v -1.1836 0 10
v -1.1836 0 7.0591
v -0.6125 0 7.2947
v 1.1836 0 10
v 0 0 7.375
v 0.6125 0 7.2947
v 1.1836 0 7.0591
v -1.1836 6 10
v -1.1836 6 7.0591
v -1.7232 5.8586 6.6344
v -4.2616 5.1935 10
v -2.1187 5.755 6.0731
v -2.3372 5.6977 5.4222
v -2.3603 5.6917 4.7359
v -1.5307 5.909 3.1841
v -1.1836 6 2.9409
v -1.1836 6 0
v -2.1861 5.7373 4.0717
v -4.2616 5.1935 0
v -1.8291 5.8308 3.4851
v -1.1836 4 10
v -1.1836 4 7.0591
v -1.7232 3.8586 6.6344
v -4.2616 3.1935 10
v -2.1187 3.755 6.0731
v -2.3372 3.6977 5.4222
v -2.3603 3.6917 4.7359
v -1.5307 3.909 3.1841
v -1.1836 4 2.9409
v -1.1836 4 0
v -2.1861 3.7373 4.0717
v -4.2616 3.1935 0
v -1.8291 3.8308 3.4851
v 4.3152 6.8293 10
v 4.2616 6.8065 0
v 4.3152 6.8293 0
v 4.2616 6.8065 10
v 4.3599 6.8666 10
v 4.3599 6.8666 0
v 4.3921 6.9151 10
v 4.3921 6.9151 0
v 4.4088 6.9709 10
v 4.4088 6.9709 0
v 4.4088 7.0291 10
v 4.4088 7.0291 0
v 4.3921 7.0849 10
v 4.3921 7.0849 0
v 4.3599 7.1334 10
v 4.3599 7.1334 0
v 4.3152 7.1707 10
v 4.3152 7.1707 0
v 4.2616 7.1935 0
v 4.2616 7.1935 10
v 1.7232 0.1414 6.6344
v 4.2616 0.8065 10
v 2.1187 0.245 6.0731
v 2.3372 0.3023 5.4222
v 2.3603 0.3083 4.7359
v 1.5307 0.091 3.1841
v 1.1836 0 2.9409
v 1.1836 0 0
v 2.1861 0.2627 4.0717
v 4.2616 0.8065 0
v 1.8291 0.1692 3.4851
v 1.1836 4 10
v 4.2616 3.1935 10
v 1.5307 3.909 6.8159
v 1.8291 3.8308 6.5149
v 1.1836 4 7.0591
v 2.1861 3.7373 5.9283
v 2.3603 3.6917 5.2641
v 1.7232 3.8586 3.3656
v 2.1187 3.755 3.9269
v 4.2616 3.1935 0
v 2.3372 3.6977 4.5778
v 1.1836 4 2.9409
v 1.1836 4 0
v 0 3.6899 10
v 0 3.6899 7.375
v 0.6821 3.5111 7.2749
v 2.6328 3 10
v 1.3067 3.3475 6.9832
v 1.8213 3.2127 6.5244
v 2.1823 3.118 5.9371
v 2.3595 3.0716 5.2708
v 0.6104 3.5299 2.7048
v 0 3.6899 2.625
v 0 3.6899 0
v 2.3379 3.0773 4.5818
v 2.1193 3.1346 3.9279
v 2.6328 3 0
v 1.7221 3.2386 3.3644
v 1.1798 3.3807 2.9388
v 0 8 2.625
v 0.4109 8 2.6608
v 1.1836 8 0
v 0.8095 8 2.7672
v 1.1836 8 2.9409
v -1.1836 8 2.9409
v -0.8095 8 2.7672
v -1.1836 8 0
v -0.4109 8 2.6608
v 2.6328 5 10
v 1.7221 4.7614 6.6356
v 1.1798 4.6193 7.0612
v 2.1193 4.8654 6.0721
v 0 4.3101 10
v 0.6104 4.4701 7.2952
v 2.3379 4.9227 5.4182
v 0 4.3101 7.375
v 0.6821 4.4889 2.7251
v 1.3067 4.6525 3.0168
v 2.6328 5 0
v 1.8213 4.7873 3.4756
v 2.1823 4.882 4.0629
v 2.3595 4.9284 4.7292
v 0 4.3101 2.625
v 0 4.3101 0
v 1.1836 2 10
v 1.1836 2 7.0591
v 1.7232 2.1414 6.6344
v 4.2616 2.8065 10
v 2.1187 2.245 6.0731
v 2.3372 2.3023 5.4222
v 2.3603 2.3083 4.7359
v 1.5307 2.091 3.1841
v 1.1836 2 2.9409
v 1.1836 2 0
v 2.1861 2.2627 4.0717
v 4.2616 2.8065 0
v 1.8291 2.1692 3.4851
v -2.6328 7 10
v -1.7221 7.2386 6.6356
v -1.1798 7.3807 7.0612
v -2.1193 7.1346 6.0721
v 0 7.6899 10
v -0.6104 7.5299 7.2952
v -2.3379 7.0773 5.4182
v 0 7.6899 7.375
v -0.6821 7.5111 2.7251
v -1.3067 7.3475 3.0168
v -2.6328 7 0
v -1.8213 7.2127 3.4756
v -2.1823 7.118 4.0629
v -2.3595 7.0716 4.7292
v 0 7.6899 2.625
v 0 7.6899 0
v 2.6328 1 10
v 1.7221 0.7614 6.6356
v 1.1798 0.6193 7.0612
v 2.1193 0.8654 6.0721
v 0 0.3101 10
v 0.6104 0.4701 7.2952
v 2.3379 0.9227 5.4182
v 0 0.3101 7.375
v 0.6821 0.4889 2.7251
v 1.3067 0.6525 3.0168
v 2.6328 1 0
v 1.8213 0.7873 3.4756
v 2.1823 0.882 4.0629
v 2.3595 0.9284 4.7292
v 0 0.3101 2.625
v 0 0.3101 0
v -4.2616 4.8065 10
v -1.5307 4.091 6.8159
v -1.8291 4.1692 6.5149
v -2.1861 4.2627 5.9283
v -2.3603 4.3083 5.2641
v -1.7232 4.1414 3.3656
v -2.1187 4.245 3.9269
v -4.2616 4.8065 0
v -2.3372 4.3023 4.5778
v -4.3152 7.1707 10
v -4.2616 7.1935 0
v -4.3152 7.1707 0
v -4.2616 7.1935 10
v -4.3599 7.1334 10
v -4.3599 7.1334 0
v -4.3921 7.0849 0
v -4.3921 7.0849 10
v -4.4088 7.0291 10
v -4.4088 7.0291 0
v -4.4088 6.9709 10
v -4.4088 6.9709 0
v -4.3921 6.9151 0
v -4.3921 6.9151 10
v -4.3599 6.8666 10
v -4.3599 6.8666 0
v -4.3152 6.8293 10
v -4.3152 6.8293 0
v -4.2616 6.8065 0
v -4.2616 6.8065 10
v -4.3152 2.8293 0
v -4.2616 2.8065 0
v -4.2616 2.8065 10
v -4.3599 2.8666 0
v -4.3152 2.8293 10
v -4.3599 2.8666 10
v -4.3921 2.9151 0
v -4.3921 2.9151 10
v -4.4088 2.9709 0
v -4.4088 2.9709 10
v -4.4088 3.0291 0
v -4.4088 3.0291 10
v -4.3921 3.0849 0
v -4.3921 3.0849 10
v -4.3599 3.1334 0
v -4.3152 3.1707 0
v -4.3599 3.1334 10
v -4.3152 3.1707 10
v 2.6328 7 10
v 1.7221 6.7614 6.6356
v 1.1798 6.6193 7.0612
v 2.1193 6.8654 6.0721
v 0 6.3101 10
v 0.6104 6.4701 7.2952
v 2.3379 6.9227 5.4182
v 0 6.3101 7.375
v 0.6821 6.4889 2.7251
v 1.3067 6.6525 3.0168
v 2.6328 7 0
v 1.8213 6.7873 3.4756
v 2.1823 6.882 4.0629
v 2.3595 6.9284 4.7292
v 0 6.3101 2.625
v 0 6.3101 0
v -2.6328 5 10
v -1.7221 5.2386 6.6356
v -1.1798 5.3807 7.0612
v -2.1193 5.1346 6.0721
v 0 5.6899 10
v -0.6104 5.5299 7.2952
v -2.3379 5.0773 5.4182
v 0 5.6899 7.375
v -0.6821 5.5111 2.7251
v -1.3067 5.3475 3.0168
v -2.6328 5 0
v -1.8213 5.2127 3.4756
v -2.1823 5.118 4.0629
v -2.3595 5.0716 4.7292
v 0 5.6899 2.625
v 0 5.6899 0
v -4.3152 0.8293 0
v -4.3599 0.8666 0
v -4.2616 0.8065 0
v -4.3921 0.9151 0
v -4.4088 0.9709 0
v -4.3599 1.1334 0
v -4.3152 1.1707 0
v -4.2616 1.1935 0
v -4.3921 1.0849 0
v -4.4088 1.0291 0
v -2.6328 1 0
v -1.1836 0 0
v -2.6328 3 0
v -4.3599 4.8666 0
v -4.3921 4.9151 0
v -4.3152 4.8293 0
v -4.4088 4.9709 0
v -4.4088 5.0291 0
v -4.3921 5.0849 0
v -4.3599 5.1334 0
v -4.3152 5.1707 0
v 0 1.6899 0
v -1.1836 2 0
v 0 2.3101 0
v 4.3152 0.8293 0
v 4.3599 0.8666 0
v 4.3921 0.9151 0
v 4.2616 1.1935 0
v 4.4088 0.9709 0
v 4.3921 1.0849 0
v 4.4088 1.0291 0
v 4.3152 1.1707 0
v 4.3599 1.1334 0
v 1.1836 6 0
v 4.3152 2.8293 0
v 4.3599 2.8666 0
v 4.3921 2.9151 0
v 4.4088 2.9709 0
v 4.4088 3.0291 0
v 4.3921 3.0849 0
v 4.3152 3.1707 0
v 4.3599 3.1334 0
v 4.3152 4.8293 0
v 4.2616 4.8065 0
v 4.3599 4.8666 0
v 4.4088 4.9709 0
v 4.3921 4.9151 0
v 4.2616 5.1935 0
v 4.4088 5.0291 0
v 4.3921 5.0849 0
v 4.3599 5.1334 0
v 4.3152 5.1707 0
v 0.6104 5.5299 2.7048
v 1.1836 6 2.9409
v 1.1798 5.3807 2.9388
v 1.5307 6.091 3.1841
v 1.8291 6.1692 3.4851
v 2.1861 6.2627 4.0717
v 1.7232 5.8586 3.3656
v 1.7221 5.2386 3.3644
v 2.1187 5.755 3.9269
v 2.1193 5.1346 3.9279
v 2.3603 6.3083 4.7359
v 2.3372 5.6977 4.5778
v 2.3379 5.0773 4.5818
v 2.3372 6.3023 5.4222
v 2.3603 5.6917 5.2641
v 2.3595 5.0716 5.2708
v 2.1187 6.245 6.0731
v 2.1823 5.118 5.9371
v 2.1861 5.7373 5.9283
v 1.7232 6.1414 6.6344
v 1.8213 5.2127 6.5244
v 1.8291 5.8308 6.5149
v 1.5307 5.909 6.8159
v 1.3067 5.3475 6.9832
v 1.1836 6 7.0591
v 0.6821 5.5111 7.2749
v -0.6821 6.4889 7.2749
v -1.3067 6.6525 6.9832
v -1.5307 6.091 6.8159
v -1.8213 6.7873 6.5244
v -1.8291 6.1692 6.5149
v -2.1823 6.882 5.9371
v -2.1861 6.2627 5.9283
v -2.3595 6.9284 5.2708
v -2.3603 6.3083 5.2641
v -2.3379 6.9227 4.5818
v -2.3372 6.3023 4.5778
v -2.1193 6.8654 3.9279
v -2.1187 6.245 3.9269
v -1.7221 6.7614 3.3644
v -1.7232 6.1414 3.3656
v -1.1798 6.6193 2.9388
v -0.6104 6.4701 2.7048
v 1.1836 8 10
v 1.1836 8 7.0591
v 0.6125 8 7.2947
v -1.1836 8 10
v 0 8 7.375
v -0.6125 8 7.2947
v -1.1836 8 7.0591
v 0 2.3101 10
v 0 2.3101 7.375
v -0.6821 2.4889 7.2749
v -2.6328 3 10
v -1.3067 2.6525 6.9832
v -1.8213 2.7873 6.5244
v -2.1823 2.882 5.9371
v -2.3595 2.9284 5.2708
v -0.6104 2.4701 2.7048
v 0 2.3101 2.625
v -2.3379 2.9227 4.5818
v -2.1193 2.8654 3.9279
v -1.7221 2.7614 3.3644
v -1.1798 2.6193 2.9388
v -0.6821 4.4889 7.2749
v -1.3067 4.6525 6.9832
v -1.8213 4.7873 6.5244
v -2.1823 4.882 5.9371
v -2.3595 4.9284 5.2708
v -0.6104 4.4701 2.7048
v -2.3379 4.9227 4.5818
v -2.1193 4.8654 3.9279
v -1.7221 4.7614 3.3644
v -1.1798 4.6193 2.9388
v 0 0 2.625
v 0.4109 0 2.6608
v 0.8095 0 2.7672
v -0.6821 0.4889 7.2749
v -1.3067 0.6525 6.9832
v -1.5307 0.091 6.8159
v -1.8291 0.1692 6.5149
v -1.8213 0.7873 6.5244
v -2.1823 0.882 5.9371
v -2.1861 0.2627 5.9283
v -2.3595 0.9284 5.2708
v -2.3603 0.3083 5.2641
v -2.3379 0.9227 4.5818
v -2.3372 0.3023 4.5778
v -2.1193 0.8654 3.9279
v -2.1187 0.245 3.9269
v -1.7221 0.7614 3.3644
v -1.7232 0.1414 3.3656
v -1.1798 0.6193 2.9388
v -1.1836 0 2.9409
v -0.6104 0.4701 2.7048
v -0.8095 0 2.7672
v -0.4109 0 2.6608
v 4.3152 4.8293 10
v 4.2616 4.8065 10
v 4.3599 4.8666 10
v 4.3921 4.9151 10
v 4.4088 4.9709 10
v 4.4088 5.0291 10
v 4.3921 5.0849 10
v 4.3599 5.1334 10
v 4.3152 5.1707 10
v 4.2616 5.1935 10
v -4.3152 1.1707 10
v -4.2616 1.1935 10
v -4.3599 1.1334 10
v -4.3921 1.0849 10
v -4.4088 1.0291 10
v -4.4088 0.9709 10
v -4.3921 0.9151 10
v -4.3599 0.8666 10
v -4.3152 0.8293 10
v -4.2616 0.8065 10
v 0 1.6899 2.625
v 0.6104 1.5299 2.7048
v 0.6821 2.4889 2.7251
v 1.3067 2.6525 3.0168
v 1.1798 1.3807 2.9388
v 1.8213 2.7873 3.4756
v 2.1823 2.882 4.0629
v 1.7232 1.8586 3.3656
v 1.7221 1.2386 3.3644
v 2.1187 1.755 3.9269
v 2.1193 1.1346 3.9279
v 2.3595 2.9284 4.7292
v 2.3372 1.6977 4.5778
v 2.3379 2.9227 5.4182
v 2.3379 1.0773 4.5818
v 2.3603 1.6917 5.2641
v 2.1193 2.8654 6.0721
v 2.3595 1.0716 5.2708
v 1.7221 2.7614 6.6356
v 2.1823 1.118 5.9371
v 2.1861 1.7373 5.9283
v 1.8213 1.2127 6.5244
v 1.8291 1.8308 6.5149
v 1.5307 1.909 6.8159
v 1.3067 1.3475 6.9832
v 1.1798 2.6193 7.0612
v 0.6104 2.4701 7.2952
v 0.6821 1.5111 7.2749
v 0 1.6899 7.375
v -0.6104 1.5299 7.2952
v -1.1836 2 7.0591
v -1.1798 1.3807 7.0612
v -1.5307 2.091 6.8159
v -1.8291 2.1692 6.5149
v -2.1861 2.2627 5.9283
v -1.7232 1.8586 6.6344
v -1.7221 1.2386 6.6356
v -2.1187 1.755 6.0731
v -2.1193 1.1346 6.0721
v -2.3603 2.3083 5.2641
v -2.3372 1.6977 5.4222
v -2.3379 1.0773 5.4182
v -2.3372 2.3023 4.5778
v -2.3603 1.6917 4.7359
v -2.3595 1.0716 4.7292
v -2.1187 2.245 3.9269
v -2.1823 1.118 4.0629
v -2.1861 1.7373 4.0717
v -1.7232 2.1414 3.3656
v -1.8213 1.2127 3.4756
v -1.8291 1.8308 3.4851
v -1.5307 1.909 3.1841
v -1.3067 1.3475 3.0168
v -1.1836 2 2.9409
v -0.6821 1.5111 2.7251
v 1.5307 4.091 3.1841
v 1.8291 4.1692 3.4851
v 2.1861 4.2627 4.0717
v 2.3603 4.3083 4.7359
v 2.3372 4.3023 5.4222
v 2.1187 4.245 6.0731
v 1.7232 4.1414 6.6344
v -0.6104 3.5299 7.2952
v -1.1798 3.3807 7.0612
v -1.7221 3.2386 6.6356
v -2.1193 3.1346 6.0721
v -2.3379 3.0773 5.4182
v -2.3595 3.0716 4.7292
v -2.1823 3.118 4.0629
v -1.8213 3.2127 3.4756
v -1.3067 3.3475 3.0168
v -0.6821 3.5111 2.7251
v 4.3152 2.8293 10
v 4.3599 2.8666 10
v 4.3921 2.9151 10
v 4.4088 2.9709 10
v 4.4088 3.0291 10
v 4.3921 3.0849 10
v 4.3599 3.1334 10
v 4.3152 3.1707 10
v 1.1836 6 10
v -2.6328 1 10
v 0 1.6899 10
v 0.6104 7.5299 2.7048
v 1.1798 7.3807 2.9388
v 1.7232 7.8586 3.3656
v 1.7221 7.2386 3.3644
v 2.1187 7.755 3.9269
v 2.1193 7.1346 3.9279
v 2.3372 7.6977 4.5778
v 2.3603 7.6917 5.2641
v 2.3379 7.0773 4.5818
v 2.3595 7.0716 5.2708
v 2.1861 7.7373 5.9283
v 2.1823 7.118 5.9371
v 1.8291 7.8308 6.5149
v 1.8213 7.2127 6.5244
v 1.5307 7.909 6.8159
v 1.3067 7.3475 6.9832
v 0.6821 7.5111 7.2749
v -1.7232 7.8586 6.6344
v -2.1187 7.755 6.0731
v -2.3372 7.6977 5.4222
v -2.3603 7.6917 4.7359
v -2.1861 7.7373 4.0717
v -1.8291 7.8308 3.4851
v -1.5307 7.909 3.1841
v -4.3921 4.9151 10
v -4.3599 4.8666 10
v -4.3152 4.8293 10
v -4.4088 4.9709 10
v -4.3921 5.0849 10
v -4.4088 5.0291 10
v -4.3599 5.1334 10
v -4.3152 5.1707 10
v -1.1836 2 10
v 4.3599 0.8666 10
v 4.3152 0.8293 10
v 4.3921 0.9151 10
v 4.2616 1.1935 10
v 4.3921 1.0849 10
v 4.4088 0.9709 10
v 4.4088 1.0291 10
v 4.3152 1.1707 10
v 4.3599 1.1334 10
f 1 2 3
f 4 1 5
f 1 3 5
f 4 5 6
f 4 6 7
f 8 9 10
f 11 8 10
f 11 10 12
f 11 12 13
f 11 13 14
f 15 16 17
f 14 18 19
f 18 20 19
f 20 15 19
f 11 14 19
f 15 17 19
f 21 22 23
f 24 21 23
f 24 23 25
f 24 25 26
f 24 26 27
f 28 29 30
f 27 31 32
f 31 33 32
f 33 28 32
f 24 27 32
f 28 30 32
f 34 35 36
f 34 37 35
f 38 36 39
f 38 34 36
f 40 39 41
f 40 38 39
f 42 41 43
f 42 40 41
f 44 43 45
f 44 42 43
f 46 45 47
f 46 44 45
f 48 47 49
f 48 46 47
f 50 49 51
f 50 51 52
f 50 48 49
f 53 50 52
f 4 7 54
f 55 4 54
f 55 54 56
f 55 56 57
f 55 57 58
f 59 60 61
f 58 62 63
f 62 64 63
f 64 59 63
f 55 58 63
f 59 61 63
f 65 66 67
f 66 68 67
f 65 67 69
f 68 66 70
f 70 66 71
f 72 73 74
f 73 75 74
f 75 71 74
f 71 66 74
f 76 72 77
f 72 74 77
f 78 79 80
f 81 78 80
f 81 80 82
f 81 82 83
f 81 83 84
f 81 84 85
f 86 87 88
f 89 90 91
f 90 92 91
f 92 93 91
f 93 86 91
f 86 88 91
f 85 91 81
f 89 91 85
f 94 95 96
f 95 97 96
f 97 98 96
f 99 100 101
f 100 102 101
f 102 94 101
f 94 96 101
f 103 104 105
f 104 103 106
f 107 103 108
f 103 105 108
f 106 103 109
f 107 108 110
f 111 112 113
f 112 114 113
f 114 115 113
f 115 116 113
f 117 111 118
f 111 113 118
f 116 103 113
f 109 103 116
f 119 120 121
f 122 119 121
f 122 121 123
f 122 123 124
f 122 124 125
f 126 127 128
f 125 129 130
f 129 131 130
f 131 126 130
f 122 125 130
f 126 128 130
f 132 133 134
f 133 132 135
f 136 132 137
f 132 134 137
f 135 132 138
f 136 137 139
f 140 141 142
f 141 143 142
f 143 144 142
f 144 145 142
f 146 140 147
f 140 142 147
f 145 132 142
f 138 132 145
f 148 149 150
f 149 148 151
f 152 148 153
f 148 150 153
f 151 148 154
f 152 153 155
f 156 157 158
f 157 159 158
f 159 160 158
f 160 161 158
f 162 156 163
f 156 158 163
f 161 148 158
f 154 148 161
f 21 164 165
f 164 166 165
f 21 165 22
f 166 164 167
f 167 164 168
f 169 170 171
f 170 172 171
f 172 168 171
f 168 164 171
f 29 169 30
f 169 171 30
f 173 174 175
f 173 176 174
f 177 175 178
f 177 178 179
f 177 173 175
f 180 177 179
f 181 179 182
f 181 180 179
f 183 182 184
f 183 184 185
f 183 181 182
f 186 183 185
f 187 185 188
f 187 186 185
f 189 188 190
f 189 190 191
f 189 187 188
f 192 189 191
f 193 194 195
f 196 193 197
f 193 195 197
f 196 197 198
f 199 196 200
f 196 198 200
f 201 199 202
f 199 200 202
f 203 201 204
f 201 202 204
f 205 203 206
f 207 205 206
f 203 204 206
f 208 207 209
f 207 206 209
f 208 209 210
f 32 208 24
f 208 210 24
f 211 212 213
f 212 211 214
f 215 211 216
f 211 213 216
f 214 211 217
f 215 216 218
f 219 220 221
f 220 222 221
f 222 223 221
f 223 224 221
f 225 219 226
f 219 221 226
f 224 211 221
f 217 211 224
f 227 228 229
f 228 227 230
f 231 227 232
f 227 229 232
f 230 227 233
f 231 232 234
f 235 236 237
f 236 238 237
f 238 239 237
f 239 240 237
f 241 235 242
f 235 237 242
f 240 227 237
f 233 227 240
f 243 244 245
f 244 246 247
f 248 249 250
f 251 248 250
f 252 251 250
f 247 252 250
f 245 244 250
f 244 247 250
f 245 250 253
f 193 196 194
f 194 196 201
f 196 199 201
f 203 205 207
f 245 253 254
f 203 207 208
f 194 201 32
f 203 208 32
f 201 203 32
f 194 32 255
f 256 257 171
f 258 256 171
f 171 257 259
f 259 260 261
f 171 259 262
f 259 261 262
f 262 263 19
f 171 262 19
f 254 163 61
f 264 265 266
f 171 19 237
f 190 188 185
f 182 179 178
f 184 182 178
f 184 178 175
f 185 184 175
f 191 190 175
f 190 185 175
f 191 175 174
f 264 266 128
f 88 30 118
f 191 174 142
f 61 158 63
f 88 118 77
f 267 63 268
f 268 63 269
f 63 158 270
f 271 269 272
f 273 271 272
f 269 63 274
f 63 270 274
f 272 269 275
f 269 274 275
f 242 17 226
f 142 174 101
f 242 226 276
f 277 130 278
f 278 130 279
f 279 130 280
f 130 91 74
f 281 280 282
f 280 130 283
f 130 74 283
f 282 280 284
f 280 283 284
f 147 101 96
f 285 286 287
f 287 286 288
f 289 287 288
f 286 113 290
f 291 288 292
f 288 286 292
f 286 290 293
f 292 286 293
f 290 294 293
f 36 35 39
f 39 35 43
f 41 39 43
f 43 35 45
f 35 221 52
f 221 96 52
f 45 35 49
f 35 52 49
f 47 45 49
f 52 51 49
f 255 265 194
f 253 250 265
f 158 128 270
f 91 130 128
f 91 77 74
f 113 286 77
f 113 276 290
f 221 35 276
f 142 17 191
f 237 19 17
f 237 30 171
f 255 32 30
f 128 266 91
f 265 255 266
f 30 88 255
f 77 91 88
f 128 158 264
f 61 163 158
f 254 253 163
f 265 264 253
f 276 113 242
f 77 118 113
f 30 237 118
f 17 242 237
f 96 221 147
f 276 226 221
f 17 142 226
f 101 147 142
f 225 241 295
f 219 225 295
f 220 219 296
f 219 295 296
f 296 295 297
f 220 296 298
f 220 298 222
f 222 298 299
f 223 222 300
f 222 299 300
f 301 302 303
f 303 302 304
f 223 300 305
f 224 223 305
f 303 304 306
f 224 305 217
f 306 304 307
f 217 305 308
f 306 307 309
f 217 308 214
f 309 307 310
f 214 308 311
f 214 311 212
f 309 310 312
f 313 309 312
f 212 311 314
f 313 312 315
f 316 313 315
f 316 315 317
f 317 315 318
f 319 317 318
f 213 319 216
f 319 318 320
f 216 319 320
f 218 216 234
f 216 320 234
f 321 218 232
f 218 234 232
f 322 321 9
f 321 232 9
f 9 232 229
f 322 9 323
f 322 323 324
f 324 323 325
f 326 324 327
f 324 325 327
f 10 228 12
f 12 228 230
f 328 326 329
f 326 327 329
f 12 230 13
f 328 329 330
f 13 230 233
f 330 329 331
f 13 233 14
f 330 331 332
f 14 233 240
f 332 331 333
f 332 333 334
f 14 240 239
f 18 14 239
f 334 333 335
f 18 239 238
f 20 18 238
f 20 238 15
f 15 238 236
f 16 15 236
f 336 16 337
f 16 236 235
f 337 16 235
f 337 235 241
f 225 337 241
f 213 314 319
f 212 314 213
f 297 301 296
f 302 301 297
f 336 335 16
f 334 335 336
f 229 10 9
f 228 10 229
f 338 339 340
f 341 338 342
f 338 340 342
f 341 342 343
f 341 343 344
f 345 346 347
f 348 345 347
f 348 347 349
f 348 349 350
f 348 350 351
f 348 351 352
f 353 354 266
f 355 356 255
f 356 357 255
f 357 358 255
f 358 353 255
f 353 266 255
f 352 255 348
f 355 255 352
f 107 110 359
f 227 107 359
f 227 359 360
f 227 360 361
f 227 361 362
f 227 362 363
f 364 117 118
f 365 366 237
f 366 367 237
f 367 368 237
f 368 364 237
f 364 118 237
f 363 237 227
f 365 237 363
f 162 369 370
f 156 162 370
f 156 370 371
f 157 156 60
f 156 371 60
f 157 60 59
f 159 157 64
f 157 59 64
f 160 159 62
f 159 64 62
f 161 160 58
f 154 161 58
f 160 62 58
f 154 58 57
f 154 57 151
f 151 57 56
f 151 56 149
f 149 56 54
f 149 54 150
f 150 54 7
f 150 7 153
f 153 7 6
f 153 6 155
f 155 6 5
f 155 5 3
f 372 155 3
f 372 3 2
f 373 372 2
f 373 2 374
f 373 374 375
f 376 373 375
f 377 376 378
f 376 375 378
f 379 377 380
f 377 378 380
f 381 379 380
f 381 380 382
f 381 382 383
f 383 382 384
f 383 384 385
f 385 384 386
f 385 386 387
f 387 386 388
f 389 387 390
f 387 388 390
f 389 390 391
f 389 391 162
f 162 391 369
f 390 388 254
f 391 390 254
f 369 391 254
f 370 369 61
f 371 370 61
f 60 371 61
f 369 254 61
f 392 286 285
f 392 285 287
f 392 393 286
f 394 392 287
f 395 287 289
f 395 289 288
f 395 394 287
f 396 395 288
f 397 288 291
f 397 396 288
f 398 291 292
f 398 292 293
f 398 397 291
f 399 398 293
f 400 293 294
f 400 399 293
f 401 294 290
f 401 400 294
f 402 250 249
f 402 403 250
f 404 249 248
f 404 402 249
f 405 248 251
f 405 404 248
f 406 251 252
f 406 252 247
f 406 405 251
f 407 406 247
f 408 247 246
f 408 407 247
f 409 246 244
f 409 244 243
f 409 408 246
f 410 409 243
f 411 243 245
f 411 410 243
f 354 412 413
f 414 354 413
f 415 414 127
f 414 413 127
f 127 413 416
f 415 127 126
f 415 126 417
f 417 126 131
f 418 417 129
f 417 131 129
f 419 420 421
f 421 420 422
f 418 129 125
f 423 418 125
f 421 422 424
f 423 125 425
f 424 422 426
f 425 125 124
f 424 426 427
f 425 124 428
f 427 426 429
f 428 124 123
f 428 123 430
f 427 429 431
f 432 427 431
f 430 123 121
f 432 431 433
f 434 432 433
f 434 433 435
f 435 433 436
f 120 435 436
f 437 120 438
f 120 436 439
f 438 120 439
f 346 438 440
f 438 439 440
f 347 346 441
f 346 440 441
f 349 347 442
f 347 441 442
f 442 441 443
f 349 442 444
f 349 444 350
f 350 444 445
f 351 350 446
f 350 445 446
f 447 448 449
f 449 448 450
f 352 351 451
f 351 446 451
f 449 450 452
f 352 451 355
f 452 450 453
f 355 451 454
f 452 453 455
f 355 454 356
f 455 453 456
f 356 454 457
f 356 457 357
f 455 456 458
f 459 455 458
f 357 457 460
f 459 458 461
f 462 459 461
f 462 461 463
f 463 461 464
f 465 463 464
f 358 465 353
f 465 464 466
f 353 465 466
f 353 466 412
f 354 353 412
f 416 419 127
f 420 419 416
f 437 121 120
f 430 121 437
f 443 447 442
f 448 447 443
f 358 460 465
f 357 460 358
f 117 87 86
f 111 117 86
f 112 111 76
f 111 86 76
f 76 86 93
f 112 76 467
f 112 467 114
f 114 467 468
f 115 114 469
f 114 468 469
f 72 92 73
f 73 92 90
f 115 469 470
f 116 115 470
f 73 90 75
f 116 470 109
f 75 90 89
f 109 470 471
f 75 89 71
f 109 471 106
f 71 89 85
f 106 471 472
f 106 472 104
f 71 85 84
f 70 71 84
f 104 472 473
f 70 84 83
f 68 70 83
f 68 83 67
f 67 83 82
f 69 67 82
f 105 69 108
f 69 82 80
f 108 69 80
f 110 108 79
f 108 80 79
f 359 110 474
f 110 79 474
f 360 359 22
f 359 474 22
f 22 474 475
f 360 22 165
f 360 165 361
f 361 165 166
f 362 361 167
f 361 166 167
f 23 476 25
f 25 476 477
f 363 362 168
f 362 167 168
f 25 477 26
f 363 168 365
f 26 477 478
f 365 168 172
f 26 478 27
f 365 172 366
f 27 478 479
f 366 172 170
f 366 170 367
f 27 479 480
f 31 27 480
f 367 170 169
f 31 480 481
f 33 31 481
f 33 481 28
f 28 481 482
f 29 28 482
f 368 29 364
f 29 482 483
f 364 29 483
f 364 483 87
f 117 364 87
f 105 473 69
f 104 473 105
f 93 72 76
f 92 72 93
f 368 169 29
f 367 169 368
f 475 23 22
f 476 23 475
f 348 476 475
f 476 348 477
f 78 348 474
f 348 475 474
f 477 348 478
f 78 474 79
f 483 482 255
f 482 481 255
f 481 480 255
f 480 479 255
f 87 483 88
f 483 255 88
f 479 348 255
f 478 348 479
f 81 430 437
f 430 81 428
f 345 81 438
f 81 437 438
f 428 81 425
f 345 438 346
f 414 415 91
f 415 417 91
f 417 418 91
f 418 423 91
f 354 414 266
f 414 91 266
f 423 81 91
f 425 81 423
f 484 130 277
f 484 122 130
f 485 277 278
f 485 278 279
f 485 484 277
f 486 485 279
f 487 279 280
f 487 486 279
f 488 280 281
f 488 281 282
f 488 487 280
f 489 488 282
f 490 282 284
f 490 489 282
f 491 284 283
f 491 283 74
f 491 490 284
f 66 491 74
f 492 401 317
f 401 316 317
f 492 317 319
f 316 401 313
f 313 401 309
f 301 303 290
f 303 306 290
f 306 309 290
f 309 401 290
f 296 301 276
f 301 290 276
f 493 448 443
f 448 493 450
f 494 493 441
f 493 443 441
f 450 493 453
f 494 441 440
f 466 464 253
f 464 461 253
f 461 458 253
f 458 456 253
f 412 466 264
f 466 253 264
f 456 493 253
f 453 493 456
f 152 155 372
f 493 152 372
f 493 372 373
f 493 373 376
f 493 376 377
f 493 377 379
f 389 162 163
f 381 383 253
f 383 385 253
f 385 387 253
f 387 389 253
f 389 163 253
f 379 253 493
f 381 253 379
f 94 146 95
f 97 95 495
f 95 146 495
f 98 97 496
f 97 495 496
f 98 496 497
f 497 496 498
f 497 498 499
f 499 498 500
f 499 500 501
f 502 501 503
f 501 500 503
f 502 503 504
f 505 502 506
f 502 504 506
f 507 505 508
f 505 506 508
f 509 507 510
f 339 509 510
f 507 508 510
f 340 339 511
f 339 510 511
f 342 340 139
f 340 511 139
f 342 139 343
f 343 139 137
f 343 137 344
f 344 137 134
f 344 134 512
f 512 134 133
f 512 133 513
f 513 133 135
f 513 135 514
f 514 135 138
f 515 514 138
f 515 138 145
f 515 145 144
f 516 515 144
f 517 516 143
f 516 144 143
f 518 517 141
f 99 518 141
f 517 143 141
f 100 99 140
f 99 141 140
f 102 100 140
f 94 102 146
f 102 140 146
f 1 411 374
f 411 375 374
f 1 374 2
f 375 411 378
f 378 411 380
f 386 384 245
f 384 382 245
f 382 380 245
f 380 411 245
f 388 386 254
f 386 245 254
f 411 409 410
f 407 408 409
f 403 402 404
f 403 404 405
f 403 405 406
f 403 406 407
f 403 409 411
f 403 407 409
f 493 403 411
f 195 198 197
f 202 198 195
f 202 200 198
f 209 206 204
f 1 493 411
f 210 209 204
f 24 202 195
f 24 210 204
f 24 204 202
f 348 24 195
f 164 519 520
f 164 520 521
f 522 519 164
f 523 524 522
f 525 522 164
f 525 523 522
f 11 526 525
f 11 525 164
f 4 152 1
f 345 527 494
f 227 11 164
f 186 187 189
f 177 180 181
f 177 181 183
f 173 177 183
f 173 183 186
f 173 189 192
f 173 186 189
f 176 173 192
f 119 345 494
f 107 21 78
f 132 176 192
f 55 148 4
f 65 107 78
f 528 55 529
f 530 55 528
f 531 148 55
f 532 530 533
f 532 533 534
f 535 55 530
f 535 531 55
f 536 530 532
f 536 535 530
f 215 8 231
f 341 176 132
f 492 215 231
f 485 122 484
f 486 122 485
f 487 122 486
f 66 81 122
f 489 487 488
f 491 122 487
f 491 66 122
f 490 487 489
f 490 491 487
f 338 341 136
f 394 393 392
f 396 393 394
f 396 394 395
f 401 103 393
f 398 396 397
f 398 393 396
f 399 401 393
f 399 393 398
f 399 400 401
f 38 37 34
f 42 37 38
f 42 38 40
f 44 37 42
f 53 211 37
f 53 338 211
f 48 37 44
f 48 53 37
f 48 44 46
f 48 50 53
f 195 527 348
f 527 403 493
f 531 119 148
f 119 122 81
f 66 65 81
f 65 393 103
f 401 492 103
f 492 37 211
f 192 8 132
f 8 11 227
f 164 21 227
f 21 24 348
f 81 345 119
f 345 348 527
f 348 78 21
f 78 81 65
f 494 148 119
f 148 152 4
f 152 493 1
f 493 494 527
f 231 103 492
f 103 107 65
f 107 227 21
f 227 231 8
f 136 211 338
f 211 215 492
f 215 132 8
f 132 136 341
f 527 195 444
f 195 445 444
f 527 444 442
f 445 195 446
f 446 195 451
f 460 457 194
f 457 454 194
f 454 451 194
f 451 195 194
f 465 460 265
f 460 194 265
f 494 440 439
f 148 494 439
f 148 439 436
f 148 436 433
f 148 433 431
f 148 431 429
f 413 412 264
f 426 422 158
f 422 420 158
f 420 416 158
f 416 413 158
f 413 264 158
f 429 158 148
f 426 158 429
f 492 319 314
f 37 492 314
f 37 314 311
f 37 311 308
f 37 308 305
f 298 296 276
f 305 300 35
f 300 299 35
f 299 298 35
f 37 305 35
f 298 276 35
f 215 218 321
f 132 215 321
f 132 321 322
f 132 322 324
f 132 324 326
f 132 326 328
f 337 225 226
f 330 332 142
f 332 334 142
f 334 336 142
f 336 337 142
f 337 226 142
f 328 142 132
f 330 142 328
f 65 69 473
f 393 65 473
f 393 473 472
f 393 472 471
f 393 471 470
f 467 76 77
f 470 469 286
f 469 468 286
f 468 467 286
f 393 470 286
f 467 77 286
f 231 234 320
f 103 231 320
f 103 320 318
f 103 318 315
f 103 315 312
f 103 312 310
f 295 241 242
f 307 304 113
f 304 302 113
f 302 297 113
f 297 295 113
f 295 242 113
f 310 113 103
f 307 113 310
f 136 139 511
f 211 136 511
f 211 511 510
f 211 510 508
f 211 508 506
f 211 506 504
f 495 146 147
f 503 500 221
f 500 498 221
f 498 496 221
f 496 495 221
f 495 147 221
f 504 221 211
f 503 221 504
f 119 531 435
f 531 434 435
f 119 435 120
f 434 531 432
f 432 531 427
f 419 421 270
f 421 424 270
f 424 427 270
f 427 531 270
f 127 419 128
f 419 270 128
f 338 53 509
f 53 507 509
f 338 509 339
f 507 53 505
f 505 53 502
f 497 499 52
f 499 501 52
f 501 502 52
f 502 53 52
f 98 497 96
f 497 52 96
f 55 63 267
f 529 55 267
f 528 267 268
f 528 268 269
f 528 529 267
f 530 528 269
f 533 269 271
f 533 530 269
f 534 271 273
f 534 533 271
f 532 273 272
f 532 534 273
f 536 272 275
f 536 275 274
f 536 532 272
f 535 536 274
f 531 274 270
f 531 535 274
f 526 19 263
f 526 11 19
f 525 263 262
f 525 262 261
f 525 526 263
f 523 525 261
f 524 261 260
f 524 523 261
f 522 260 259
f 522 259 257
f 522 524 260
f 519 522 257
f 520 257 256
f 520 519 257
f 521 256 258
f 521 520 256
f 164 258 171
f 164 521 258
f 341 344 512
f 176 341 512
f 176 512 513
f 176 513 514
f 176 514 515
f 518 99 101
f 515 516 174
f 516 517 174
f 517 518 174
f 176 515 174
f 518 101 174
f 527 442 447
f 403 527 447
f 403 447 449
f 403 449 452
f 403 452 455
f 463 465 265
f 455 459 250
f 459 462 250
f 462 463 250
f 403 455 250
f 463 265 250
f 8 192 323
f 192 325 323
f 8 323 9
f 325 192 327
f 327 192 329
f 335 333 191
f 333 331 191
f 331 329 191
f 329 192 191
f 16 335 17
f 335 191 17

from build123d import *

# Parameters (mm, degrees)
BOSS_EXTRUDE3_DEPTH = 10
LPATTERN1_COUNT     = 4
LPATTERN1_PITCH     = 2
SKETCH3_R           = 2.375
CUT_EXTRUDE1_DEPTH  = 14.747727085
FILLET1_R           = 0.2


with BuildPart() as part:
    # Sketch2 → Boss-Extrude3 (new body)
    with BuildSketch(Plane.XY):
        Polygon((-5, 1), (-1.183578012, 0), (0, 0.310127658), (-2.632843976, 1), (0, 1.689872342), (-1.183578012, 2), align=None)
        Polygon((0, 0.310127658), (1.183578012, 0), (5, 1), (1.183578012, 2), (0, 1.689872342), (2.632843976, 1), align=None)
        Polygon((1.183578012, 2), (-1.183578012, 2), (0, 1.689872342), align=None)
        Polygon((0, 0.310127658), (-1.183578012, 0), (1.183578012, 0), align=None)
    boss_extrude3 = extrude(amount=BOSS_EXTRUDE3_DEPTH)

    # LPattern1: Boss-Extrude3 ×4
    with Locations(*[(0, i * LPATTERN1_PITCH, 0) for i in range(1, LPATTERN1_COUNT)]):
        add(boss_extrude3)

    # Sketch3 → Cut-Extrude1 (cut, through all)
    with BuildSketch(Plane.XZ):
        with Locations(Location((0, 5, 0), (0, 0, 270))):
            Circle(SKETCH3_R)
    extrude(amount=-CUT_EXTRUDE1_DEPTH, mode=Mode.SUBTRACT)

    # Fillet1
    fillet1_edges = [part.edges().sort_by_distance(p)[0] for p in [
        (5, 1, 5),
        (-5, 1, 5),
        (5, 3, 5),
        (-5, 3, 5),
        (5, 5, 5),
        (-5, 5, 5),
        (5, 7, 5),
        (-5, 7, 5),
    ]]
    fillet(fillet1_edges, radius=FILLET1_R)


solid = part.part
